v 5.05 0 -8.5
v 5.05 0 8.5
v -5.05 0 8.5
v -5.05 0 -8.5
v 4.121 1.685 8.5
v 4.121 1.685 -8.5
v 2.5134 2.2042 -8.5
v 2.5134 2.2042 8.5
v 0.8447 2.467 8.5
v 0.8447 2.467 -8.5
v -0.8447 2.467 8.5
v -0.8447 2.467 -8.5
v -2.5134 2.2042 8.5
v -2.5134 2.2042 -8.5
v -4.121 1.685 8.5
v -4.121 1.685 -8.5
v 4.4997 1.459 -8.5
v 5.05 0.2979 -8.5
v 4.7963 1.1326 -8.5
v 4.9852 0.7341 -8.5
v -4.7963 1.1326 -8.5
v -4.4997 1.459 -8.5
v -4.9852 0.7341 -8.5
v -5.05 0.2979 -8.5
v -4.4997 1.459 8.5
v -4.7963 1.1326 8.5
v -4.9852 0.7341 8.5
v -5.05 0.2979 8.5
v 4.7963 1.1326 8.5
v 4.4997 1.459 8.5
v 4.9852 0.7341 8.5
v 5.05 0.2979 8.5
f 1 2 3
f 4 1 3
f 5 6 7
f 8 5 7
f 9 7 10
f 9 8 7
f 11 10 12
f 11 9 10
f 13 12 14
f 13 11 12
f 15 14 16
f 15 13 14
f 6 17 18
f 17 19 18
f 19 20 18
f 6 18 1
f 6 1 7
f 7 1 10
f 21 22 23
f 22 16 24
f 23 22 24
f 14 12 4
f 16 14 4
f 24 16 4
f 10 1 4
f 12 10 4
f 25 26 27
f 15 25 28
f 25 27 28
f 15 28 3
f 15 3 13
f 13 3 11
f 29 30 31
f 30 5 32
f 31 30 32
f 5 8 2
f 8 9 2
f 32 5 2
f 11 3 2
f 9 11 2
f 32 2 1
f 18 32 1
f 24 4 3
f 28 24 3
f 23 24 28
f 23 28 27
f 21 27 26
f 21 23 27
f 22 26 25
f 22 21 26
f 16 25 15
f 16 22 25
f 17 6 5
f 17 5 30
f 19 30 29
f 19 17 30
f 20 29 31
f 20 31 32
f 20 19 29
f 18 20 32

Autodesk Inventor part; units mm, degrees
ref_plane "YZ Plane" through (0, 0, 0) normal (1, 0, 0) x (0, 1, 0)
ref_plane "XZ Plane" through (0, 0, 0) normal (0, 1, 0) x (-1, 0, 0)
ref_plane "XY Plane" through (0, 0, 0) normal (0, 0, 1) x (1, 0, 0)
sketch "Sketch1" plane through (0, 0, 0) normal (0, 1, 0) x (-1, 0, 0)
  line L0 (5.05, 8.5) -> (-5.05, 8.5)
  line L1 (-5.05, 8.5) -> (-5.05, -8.5)
  line L2 (-5.05, -8.5) -> (5.05, -8.5)
  line L3 (5.05, -8.5) -> (5.05, 8.5)
  line L4 (5.05, 8.5) -> (-5.05, -8.5) construction
  line L5 (-5.05, 8.5) -> (5.05, -8.5) construction
  point P0 (0, 0)
  dimension "d0" = 10.1
  dimension "d1" = 17
extrude "Extrusion1" add sketch "Sketch1" along normal blind 2.5
sketch "Sketch2" plane through (-5.05, 0, 8.5) normal (0, 0, 1) x (1, 0, 0)
  line L0 (10.1, 0) -> (10.1, 2.5) projected
  line L1 (0, 0) -> (0, 2.5) projected
  arc A0 (10.1, 1.25) -> (0, 1.25) centre (5.05, -8.326) ccw
  line L2 (10.1, 0) -> (0, 0) projected
  line L3 (0, 0) -> (10.1, 0)
  line L4 (10.1, 0) -> (10.1, 1.25)
  point P0 (5.05, 0)
extrude "Extrusion2" cut sketch "Sketch2" against normal blind 18.1375 keep common part
fillet "Fillet1" radius 1.5 2 edges at (-5.05, 1.25, 0) (5.05, 1.25, 0)
properties part number "LED-streifen"
